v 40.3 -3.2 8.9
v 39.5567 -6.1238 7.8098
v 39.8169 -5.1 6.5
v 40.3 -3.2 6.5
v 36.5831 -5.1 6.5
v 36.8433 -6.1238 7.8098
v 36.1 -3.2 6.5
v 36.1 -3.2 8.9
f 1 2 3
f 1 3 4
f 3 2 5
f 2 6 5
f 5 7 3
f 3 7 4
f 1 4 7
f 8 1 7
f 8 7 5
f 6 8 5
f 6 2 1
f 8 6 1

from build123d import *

# Parameters (mm, degrees)
PAD187_DEPTH    = 2.4
POCKET153_DEPTH = 5
POCKET154_DEPTH = 5


with BuildPart() as part:
    # Sketch321 (on Face1 of Binder) → Pad187 (new body)
    with BuildSketch(Plane.XY.offset(6.5)):
        Polygon((36.1, -3.2), (36.85, -6.15), (39.55, -6.15), (40.3, -3.2), align=None)
    extrude(amount=PAD187_DEPTH)

    # Sketch322 (on Face1 of Binder002) → Pocket153 (cut)
    with BuildSketch(Plane(origin=(36, 0, 0), x_dir=(0, -1, 0), z_dir=(-1, 0, 0))):
        Polygon((6.15, 7.8), (3.2, 8.9), (6.15, 8.9), align=None)
    extrude(amount=-POCKET153_DEPTH, mode=Mode.SUBTRACT)

    # Sketch323 (on Face1 of Binder002) → Pocket154 (cut)
    with BuildSketch(Plane(origin=(36, 0, 0), x_dir=(0, -1, 0), z_dir=(-1, 0, 0))):
        Polygon((6.123765, 7.809783), (5.1, 6.5), (6.15, 6.5), (6.15, 7.8), align=None)
    extrude(amount=-POCKET154_DEPTH, mode=Mode.SUBTRACT)


solid = part.part
